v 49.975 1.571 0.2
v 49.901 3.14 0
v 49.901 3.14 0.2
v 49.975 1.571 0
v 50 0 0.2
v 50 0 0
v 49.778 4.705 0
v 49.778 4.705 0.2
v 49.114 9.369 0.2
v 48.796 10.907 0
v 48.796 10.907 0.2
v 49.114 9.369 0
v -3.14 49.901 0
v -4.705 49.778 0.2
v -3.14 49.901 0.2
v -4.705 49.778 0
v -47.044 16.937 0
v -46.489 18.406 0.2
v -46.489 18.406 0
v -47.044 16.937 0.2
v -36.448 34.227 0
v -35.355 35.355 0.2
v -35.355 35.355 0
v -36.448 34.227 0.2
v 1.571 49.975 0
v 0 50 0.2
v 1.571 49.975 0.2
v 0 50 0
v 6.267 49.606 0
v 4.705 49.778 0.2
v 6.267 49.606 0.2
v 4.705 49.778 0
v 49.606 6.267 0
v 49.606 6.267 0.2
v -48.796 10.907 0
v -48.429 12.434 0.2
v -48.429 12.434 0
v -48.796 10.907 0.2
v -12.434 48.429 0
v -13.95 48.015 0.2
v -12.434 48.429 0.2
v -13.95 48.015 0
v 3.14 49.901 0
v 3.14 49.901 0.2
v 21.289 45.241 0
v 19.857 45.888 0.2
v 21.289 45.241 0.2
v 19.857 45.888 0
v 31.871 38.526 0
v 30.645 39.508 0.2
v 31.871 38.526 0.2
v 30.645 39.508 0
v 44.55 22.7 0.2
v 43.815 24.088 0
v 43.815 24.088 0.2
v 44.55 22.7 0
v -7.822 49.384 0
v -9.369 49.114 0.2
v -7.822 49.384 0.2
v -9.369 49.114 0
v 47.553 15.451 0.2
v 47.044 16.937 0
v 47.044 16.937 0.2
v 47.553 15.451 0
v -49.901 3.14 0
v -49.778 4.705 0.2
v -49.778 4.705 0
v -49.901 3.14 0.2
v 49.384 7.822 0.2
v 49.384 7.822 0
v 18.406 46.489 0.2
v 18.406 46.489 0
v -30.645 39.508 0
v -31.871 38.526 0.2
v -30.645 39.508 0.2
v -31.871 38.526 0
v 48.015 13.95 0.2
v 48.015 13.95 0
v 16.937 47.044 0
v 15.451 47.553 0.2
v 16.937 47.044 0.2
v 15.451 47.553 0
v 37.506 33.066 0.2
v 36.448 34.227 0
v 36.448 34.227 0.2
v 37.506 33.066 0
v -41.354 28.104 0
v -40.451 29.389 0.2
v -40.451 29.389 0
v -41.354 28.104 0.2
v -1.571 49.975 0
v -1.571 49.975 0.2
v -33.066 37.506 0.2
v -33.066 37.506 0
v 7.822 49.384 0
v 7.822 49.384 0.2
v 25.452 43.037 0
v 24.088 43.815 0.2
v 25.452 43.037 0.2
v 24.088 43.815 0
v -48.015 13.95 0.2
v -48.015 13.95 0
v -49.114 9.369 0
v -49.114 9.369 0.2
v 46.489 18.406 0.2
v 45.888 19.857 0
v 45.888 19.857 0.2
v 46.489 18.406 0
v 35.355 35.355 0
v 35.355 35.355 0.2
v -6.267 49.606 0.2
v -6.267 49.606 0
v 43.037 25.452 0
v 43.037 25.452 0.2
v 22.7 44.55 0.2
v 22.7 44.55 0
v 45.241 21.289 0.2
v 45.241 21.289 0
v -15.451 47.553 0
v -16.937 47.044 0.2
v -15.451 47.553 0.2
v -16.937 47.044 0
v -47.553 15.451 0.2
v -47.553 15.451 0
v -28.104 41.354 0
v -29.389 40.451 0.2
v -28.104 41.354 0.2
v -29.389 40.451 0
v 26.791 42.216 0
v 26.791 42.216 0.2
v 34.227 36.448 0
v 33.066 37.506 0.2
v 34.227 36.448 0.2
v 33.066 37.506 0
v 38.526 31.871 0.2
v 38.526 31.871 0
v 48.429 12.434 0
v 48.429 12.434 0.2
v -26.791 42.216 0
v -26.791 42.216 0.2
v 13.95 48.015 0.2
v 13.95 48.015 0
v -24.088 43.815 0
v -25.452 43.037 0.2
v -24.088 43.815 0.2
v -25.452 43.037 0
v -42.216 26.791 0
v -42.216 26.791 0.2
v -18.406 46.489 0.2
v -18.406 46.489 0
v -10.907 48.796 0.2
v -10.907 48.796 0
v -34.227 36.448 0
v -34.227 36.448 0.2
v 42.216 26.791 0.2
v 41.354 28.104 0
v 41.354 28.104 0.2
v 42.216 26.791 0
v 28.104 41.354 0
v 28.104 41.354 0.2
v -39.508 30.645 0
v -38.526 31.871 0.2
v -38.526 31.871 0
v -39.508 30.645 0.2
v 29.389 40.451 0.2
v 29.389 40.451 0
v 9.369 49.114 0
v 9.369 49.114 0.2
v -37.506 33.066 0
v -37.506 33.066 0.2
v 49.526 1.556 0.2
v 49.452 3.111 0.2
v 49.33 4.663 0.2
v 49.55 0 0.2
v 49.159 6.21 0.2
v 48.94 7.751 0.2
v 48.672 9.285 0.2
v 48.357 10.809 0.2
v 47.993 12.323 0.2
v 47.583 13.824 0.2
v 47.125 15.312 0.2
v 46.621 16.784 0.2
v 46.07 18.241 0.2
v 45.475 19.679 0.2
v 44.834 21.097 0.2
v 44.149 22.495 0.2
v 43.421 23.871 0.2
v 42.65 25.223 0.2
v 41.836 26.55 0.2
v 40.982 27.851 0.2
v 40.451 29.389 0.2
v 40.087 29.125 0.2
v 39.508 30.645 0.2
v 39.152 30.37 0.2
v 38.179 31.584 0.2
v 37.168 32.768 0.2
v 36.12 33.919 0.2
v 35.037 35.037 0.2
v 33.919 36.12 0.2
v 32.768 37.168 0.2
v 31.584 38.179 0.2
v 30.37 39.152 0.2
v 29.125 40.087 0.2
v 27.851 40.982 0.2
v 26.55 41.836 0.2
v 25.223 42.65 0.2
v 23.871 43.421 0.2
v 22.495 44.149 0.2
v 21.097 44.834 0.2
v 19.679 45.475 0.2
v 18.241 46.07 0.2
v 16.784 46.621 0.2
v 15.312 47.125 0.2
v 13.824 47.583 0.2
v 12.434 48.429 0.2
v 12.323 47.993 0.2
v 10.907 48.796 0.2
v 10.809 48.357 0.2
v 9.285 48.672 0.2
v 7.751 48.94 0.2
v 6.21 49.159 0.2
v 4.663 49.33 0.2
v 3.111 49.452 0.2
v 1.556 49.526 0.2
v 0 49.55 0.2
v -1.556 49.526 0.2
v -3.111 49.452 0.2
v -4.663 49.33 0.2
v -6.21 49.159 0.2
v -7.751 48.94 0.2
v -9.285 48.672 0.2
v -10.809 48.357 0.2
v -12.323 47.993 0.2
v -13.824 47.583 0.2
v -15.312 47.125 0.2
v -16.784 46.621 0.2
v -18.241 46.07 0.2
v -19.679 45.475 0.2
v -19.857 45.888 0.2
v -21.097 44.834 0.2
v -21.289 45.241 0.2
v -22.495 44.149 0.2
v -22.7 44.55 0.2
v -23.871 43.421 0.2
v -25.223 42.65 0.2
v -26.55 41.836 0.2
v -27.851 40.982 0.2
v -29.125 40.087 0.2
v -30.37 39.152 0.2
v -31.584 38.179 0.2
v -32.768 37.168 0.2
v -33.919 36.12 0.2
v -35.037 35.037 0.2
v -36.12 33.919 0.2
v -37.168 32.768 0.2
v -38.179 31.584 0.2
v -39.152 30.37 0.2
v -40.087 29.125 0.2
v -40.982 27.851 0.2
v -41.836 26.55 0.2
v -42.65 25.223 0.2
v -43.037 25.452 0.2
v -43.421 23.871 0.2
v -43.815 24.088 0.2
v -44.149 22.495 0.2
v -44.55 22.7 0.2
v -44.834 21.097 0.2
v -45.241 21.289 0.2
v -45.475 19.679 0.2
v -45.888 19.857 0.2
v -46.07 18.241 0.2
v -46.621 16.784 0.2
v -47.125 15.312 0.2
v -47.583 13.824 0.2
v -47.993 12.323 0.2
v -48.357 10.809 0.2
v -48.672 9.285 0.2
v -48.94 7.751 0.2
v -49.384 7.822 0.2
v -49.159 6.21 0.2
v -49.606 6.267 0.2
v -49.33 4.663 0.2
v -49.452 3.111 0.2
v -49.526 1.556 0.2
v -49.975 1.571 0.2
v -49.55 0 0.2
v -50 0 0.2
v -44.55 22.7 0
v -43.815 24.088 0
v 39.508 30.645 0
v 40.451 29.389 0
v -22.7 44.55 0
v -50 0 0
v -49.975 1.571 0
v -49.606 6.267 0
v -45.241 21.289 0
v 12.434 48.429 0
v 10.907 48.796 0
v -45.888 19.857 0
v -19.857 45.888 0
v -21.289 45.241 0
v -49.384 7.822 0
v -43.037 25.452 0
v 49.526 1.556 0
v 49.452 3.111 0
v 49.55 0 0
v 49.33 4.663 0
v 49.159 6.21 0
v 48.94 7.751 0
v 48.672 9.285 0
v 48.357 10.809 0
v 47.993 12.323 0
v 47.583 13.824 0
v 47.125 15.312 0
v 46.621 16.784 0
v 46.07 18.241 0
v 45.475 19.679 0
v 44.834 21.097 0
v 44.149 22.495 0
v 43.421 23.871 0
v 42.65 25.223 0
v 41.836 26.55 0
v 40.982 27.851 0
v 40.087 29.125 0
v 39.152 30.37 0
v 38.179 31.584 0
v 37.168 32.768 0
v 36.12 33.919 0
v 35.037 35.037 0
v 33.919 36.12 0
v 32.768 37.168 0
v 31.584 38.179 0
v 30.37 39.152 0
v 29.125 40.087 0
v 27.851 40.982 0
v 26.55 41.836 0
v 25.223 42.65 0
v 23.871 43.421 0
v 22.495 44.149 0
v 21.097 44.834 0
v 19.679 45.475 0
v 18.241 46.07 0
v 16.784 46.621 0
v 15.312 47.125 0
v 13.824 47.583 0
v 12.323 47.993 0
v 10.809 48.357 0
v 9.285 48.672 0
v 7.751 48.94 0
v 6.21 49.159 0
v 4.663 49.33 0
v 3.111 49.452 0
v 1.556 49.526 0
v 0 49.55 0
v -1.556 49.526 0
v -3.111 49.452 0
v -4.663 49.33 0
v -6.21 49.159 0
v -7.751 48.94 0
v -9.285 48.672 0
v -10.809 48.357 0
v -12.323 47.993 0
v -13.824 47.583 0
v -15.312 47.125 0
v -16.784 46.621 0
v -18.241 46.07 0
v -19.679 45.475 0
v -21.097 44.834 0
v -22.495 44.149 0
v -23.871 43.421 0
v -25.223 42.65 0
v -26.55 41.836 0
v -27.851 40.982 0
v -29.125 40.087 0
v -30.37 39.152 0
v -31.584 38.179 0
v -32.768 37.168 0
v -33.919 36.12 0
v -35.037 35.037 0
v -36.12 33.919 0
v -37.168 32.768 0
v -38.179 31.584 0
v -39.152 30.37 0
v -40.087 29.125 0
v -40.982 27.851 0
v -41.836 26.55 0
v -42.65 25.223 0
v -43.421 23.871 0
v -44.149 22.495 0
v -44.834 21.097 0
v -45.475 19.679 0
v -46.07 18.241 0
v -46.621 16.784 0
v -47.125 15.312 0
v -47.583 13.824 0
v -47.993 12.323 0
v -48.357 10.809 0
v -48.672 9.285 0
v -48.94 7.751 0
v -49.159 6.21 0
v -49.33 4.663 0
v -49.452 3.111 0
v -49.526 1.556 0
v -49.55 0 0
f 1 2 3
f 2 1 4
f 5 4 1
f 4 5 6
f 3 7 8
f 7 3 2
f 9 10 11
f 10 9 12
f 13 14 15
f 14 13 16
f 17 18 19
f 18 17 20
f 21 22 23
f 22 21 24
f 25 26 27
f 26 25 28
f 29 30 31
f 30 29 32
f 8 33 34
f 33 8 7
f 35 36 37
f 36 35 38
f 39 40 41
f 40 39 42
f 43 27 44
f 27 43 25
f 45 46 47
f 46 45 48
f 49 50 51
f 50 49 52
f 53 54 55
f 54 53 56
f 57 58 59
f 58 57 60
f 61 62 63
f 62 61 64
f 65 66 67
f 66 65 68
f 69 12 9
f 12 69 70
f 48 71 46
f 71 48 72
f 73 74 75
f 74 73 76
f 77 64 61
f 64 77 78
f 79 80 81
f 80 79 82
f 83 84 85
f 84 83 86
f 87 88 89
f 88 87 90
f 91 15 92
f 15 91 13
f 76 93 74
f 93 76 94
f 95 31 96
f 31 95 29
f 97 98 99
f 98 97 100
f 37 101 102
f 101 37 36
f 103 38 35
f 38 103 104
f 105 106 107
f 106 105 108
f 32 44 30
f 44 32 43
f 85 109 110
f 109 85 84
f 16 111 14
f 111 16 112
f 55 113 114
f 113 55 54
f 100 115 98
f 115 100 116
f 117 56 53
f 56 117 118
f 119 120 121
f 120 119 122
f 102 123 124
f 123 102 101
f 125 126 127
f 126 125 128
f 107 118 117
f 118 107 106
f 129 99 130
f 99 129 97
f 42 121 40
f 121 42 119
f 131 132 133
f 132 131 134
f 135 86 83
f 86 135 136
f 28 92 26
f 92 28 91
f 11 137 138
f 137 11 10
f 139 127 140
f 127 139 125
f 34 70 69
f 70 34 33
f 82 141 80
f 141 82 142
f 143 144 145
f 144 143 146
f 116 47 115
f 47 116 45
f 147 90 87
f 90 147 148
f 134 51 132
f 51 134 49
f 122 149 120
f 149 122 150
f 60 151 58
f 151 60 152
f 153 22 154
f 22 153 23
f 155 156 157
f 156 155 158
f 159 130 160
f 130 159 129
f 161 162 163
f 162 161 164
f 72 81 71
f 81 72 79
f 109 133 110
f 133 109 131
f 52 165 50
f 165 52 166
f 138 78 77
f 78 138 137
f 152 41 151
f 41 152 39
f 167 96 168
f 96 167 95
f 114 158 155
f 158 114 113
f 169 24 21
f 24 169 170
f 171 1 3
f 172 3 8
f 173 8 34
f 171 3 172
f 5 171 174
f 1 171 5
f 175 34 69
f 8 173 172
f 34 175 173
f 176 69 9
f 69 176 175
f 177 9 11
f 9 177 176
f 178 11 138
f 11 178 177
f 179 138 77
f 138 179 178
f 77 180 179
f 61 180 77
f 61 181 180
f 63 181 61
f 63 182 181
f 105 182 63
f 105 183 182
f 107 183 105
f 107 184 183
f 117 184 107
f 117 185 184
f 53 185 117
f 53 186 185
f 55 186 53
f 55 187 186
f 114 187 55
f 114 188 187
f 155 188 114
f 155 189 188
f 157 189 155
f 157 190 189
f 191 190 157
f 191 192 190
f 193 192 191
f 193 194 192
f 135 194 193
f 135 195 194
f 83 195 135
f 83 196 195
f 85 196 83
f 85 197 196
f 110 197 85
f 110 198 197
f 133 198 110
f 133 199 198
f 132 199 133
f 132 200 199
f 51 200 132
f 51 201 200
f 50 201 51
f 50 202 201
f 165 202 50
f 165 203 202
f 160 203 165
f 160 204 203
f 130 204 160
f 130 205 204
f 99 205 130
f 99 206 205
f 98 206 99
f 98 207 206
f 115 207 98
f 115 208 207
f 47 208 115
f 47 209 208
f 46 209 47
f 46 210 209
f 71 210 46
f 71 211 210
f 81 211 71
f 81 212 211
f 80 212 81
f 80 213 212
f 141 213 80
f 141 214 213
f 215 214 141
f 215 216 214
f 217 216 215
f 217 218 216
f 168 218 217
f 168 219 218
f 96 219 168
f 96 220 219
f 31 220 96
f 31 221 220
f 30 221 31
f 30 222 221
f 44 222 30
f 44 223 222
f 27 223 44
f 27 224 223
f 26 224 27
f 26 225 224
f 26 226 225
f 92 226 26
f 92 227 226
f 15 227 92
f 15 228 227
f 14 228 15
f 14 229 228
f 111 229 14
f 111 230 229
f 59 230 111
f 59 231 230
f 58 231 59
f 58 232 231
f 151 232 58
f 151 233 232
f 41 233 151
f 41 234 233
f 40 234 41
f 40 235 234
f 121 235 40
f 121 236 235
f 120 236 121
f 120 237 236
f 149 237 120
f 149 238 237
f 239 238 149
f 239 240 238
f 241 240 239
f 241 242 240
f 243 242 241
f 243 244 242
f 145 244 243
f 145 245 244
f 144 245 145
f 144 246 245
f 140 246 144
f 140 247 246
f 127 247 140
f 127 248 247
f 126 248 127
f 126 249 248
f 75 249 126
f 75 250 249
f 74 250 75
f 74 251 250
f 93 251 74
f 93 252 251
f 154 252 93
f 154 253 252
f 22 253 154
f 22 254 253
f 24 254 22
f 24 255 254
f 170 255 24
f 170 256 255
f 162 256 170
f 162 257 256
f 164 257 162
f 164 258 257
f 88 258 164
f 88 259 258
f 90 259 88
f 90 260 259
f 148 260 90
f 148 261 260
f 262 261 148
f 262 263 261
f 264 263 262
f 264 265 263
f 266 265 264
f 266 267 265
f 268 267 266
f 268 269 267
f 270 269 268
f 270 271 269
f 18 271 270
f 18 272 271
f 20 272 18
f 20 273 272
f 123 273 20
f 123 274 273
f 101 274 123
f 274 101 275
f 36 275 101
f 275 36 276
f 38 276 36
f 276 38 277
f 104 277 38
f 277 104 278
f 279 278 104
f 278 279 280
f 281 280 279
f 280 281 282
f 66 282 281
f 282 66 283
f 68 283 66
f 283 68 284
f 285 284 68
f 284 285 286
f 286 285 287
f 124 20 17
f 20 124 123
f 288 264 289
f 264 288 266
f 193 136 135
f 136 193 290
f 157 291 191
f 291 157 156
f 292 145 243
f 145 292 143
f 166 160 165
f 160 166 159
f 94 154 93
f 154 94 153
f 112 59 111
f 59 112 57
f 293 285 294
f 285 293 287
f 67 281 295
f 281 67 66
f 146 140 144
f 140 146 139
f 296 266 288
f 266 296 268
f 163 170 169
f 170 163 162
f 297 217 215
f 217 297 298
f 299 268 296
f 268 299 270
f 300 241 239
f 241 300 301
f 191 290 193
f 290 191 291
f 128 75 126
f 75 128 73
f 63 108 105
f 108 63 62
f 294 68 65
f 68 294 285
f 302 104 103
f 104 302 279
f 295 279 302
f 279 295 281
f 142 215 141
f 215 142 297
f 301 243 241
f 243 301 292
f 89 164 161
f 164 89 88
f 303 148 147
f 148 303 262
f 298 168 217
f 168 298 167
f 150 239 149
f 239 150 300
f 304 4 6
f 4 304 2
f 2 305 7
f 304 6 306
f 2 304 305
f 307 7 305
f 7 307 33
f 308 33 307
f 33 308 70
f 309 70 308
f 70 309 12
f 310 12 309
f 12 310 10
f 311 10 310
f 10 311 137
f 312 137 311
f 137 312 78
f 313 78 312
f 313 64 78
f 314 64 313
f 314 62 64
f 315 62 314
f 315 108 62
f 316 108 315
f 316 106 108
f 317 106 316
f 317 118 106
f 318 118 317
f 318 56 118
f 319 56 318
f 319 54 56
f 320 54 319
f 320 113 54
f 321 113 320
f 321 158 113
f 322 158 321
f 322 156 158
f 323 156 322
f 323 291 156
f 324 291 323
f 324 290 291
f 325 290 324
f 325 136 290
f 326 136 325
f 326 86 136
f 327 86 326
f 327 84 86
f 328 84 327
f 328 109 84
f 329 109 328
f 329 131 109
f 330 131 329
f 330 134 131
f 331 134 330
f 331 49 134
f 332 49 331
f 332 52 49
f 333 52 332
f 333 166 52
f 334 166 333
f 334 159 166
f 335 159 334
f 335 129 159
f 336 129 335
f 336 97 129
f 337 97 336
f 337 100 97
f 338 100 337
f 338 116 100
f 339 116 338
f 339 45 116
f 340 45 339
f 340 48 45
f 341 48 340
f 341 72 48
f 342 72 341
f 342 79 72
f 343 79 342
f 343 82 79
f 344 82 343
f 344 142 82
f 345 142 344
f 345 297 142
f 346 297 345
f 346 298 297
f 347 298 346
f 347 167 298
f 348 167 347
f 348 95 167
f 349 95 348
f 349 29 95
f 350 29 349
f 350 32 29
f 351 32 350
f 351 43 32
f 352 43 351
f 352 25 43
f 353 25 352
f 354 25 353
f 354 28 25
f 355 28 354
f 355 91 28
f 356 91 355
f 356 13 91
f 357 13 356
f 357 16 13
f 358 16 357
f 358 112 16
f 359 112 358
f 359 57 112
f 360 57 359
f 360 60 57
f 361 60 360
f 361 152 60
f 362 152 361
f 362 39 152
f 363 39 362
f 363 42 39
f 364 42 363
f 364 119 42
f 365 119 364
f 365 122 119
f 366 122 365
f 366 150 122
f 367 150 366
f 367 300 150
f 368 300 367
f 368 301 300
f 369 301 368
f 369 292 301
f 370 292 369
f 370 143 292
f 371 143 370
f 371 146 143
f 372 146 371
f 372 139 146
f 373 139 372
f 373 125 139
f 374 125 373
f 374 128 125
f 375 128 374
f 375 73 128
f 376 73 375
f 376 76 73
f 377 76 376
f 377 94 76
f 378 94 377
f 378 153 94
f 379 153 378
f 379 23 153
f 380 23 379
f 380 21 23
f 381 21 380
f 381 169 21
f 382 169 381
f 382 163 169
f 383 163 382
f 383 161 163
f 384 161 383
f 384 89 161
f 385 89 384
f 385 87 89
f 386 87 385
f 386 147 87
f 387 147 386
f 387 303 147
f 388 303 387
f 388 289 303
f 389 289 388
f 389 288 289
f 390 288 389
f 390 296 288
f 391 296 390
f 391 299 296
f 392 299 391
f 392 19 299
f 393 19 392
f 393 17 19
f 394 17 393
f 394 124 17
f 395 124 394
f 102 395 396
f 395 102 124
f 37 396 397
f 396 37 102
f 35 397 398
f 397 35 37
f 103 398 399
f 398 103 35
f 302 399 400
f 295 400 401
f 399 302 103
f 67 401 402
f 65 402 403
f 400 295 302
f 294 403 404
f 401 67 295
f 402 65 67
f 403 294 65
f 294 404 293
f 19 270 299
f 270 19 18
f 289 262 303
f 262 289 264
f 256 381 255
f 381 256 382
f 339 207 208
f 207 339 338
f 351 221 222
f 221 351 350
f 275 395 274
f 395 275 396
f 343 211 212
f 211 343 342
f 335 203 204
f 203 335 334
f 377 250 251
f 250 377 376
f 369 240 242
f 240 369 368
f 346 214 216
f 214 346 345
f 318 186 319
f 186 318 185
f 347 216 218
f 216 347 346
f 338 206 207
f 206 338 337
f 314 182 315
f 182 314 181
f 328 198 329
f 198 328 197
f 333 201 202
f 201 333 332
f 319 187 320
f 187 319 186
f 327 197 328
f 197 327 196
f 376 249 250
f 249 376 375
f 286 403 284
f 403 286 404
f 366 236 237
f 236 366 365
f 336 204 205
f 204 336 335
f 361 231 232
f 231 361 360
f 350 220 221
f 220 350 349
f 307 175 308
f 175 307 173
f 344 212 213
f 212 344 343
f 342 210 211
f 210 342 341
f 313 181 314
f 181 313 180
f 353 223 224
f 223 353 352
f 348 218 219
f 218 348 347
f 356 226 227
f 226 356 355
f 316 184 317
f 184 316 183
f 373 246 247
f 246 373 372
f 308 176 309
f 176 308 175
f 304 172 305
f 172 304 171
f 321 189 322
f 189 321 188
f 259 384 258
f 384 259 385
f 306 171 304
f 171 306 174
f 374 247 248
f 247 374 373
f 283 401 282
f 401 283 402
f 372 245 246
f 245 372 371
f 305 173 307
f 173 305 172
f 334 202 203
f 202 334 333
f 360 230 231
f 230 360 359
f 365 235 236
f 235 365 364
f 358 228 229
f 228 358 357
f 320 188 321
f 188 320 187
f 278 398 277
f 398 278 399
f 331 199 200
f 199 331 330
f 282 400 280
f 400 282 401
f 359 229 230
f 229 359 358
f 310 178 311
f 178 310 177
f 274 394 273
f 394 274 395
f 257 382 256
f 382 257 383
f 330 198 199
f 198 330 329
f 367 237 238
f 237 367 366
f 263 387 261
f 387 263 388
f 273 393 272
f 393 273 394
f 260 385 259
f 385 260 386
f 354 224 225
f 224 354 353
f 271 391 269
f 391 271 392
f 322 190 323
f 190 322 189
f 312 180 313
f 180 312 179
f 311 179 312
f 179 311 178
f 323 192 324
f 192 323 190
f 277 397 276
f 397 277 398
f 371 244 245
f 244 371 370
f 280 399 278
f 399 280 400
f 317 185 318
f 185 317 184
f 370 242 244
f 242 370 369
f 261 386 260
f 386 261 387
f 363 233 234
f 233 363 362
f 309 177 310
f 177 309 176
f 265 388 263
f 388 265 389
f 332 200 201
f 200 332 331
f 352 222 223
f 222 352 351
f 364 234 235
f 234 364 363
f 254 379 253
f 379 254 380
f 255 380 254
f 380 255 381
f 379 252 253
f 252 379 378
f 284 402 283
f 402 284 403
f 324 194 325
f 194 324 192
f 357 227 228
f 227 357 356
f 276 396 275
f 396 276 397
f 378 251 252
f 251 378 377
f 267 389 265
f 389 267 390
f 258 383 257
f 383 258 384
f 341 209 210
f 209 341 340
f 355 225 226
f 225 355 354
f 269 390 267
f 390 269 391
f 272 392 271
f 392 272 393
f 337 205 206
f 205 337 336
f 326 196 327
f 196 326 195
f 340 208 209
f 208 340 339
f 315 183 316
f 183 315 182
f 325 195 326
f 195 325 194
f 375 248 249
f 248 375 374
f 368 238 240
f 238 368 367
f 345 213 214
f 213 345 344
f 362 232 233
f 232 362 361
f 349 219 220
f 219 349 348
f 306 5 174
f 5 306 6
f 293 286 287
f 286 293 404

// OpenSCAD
$fn=200;
difference() {
    cylinder(d=100,h = 0.2);
    translate([0,0,-5])cylinder(d=99.1,h = 60);
    translate([0,-30,25]) cube(center = true,size = [200,60,60] );
}
